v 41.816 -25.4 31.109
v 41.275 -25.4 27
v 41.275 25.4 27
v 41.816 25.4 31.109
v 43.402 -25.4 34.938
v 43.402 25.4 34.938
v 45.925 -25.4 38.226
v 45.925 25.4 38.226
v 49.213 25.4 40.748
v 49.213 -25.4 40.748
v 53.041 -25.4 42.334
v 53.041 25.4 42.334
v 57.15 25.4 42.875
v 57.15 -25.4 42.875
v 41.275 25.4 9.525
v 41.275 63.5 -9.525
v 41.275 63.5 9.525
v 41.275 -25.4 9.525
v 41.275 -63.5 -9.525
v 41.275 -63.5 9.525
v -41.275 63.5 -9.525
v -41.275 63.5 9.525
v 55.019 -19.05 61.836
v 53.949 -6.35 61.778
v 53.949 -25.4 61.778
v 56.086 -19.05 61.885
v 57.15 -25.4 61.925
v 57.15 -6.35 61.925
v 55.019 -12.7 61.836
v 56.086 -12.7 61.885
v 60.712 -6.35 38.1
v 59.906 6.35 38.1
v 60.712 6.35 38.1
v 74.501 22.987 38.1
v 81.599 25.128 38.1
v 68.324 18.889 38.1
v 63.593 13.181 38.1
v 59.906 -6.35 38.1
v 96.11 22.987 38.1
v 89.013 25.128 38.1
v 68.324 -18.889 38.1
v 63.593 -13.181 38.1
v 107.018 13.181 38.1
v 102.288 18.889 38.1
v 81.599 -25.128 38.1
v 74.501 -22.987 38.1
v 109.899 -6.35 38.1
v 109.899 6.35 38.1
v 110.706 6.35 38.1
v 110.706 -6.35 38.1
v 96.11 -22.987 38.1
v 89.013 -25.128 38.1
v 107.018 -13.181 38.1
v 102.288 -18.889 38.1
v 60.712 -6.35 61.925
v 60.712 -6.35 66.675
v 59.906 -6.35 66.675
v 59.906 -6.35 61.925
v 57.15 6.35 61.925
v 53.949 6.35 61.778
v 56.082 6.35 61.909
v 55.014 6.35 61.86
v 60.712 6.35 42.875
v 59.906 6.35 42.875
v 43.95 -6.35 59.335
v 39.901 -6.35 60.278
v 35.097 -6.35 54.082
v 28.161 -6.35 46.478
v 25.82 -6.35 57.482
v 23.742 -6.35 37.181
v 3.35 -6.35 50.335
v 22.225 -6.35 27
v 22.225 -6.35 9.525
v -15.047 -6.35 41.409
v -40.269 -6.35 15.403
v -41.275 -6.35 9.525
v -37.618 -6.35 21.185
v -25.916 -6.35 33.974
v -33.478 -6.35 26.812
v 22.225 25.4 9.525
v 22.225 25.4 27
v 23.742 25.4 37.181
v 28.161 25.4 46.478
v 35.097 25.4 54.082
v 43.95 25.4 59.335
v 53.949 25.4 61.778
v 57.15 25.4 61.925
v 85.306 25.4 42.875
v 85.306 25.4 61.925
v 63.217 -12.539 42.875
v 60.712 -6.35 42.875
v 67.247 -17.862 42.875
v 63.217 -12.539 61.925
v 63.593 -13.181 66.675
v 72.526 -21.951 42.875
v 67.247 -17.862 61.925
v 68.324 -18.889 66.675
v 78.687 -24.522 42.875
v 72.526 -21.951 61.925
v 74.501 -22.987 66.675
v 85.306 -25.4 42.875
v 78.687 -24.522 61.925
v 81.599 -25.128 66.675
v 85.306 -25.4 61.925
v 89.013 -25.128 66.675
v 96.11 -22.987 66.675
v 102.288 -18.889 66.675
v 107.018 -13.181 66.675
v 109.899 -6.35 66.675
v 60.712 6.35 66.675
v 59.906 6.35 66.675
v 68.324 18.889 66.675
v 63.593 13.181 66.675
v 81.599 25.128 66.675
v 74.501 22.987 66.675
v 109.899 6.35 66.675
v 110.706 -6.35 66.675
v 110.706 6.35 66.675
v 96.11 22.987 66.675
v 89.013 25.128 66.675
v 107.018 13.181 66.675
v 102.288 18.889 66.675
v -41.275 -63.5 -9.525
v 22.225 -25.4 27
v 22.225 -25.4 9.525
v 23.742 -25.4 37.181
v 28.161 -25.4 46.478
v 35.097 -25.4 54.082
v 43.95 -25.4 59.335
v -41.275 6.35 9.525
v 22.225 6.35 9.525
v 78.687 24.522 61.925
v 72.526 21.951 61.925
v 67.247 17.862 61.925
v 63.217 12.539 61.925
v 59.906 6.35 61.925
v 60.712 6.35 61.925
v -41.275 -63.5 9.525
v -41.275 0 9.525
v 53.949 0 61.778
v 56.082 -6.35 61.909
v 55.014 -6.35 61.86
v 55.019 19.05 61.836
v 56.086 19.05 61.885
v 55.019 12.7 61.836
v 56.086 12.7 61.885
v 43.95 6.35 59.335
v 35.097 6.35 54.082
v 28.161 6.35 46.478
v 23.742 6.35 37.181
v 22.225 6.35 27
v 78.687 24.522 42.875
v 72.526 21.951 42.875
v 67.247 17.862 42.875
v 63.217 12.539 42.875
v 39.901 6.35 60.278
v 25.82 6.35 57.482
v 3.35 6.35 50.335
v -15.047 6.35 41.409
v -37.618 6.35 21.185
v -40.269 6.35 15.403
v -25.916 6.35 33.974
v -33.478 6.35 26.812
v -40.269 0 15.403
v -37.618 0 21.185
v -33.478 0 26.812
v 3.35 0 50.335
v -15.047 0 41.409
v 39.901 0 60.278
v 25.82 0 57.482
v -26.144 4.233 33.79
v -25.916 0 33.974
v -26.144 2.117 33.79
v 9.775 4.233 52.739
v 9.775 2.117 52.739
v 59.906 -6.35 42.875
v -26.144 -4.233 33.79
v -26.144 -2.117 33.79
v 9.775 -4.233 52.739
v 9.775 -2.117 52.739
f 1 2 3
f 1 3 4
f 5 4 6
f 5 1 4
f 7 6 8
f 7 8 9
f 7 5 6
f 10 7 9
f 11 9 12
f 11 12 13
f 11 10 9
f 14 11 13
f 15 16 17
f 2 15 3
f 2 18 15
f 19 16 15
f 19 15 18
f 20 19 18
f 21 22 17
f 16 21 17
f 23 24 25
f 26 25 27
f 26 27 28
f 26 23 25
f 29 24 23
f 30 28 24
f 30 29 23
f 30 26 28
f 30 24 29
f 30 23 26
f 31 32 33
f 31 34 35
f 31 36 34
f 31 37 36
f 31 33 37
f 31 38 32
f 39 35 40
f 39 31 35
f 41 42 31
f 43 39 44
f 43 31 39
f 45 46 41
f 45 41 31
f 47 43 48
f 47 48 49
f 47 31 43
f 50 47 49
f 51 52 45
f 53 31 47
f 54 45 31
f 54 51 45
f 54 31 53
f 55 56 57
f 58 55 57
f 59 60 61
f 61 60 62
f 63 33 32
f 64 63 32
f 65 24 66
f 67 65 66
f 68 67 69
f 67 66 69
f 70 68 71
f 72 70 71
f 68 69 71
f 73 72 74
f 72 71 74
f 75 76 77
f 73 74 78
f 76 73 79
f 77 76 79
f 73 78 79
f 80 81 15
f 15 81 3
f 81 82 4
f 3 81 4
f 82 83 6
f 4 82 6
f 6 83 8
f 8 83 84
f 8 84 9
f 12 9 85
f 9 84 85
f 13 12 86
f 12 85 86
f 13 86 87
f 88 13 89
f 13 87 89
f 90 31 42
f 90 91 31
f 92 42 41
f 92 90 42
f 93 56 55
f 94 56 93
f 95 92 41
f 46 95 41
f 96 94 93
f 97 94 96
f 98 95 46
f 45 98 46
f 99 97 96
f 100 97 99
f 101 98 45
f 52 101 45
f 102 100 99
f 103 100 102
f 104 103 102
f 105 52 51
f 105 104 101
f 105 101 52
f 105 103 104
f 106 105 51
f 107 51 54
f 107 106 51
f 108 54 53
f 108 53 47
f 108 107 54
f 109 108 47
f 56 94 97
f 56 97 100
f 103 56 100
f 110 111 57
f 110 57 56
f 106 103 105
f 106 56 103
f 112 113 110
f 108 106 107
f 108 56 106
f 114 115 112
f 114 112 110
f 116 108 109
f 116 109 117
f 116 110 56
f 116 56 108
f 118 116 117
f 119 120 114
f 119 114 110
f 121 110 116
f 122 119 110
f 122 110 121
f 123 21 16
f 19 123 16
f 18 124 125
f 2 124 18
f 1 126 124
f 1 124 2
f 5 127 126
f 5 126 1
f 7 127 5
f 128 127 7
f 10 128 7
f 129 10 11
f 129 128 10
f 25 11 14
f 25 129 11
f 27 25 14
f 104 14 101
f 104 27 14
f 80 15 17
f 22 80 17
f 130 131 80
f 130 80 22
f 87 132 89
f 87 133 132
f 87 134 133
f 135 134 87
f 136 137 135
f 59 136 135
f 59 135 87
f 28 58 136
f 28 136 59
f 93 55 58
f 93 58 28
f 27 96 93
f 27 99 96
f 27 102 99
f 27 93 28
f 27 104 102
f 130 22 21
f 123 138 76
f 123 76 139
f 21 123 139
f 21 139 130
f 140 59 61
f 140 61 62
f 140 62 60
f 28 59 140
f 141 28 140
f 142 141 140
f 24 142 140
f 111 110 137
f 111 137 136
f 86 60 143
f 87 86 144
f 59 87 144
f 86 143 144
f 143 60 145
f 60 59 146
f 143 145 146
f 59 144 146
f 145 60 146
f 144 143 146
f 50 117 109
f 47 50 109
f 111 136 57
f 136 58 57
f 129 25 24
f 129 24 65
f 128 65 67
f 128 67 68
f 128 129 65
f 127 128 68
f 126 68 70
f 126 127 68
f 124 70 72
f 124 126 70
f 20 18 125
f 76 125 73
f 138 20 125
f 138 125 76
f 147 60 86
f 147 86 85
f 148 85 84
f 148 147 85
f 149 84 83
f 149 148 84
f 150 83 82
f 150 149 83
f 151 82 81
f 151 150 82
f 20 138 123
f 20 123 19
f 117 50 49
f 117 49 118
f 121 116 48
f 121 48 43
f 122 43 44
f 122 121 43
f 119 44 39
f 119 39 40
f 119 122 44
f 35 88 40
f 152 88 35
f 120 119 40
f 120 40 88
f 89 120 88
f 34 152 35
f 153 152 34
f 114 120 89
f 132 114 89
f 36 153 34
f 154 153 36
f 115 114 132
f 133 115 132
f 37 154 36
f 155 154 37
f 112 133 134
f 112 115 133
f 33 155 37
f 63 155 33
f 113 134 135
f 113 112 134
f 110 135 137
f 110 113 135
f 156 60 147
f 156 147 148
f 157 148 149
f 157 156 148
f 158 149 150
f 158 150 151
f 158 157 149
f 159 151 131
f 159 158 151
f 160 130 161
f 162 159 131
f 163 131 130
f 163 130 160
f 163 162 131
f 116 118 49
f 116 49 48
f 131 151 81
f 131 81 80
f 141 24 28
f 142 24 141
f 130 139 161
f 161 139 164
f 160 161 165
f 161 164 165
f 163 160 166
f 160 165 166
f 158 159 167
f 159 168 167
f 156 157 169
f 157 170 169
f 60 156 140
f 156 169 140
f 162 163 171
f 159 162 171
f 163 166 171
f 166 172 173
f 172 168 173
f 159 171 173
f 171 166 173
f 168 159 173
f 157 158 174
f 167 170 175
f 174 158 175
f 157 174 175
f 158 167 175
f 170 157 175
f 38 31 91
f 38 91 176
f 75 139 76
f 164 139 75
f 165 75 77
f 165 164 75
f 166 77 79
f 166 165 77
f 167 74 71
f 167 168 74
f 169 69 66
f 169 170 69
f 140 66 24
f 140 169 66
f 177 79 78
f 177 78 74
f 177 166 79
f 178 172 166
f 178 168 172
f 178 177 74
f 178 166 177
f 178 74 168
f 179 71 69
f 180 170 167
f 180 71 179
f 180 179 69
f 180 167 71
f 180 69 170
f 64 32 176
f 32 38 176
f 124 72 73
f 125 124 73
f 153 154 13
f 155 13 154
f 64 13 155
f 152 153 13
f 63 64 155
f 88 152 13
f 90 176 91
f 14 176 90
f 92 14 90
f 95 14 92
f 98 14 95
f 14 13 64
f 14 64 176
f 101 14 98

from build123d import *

# Parameters (mm, degrees)
F1_DEPTH = 63.5
F0_W     = 25.4
F0_H     = 19.05
F2_DEPTH = 25.4
F0_H_2   = 4.7498
F0_H_3   = 4.7752
F3_DEPTH = 6.35


with BuildPart() as f1:
    # F0 (on Front) → F1 (new body, symmetric)
    with BuildSketch(Plane.XZ):
        Polygon((22.225, 9.525), (-41.275, 9.525), (-41.275, -9.525), (41.275, -9.525), (41.275, 9.525), align=None)
    extrude(amount=F1_DEPTH, both=True)

    # F0 (on Front) → F2 (join, symmetric)
    with BuildSketch(Plane.XZ):
        with BuildLine():
            Line((22.225, 27.0002), (22.225, 9.525))
            Line((22.225, 9.525), (41.275, 9.525))
            Line((41.275, 9.525), (41.275, 27.0002))
            ThreePointArc((41.275, 27.0002), (45.9246798487, 38.2255201513), (57.15, 42.8752))
            Line((57.15, 42.8752), (59.9058770299, 42.8752))
            Line((59.9058770299, 42.8752), (59.9058770299, 61.9252))
            Line((59.9058770299, 61.9252), (57.15, 61.9252))
            add(Edge.make_bspline(
                [(53.9486358341, 61.7781656173), (55.0198111494, 61.8401017222), (56.0872015852, 61.8892118375), (57.15, 61.9252)],
                knots=[108.8616343251, 108.8616343251, 108.8616343251, 108.8616343251, 111.5045361635, 111.5045361635, 111.5045361635, 111.5045361635], degree=3))
            ThreePointArc((53.9486358341, 61.7781656173), (31.3472552962, 50.5368520719), (22.225, 27.0002))
        make_face()
        with Locations((72.6058770299, 52.4002)):
            Rectangle(F0_W, F0_H)
    extrude(amount=F2_DEPTH, both=True)

    # F0 (on Front) → F3 (join, symmetric)
    with BuildSketch(Plane.XZ):
        with BuildLine():
            add(Edge.make_bspline(
                [(-41.275, 9.525), (-40.7167454474, 34.9148619979), (9.8267188659, 59.2270055586), (53.9486358341, 61.7781656173)],
                knots=[0, 0, 0, 0, 108.8616343251, 108.8616343251, 108.8616343251, 108.8616343251], degree=3))
            Line((-41.275, 9.525), (22.225, 9.525))
            Line((22.225, 9.525), (22.225, 27.0002))
            ThreePointArc((22.225, 27.0002), (31.3472552962, 50.5368520719), (53.9486358341, 61.7781656173))
        make_face()
        Polygon((22.225, 9.525), (-41.275, 9.525), (-41.275, -9.525), (41.275, -9.525), (41.275, 9.525), align=None)
        with BuildLine():
            Line((22.225, 27.0002), (22.225, 9.525))
            Line((22.225, 9.525), (41.275, 9.525))
            Line((41.275, 9.525), (41.275, 27.0002))
            ThreePointArc((41.275, 27.0002), (45.9246798487, 38.2255201513), (57.15, 42.8752))
            Line((57.15, 42.8752), (59.9058770299, 42.8752))
            Line((59.9058770299, 42.8752), (59.9058770299, 61.9252))
            Line((59.9058770299, 61.9252), (57.15, 61.9252))
            add(Edge.make_bspline(
                [(53.9486358341, 61.7781656173), (55.0198111494, 61.8401017222), (56.0872015852, 61.8892118375), (57.15, 61.9252)],
                knots=[108.8616343251, 108.8616343251, 108.8616343251, 108.8616343251, 111.5045361635, 111.5045361635, 111.5045361635, 111.5045361635], degree=3))
            ThreePointArc((53.9486358341, 61.7781656173), (31.3472552962, 50.5368520719), (22.225, 27.0002))
        make_face()
        with BuildLine():
            ThreePointArc((57.15, 61.9252), (55.5476305332, 61.8884220397), (53.9486358341, 61.7781656173))
            add(Edge.make_bspline(
                [(53.9486358341, 61.7781656173), (55.0198111494, 61.8401017222), (56.0872015852, 61.8892118375), (57.15, 61.9252)],
                knots=[108.8616343251, 108.8616343251, 108.8616343251, 108.8616343251, 111.5045361635, 111.5045361635, 111.5045361635, 111.5045361635], degree=3))
        make_face()
        with Locations((72.6058770299, 52.4002)):
            Rectangle(F0_W, F0_H)
        with Locations((72.6058770299, 64.3001)):
            Rectangle(F0_W, F0_H_2)
        with Locations((72.6058770299, 40.4876)):
            Rectangle(F0_W, F0_H_3)
        Polygon((85.3058770299, 66.675), (85.3058770299, 61.9252), (85.3058770299, 42.8752), (85.3058770299, 38.1), (110.7058770299, 38.1), (110.7058770299, 66.675), align=None)
    extrude(amount=F3_DEPTH, both=True)

    # F0 (on Front) → F4 (revolve)
    with BuildSketch(Plane.XZ):
        Polygon((85.3058770299, 66.675), (85.3058770299, 61.9252), (85.3058770299, 42.8752), (85.3058770299, 38.1), (110.7058770299, 38.1), (110.7058770299, 66.675), align=None)
    revolve(axis=Axis((85.3058770299, 0, 52.3875), (0, 0, 1)))


solid = f1.part
